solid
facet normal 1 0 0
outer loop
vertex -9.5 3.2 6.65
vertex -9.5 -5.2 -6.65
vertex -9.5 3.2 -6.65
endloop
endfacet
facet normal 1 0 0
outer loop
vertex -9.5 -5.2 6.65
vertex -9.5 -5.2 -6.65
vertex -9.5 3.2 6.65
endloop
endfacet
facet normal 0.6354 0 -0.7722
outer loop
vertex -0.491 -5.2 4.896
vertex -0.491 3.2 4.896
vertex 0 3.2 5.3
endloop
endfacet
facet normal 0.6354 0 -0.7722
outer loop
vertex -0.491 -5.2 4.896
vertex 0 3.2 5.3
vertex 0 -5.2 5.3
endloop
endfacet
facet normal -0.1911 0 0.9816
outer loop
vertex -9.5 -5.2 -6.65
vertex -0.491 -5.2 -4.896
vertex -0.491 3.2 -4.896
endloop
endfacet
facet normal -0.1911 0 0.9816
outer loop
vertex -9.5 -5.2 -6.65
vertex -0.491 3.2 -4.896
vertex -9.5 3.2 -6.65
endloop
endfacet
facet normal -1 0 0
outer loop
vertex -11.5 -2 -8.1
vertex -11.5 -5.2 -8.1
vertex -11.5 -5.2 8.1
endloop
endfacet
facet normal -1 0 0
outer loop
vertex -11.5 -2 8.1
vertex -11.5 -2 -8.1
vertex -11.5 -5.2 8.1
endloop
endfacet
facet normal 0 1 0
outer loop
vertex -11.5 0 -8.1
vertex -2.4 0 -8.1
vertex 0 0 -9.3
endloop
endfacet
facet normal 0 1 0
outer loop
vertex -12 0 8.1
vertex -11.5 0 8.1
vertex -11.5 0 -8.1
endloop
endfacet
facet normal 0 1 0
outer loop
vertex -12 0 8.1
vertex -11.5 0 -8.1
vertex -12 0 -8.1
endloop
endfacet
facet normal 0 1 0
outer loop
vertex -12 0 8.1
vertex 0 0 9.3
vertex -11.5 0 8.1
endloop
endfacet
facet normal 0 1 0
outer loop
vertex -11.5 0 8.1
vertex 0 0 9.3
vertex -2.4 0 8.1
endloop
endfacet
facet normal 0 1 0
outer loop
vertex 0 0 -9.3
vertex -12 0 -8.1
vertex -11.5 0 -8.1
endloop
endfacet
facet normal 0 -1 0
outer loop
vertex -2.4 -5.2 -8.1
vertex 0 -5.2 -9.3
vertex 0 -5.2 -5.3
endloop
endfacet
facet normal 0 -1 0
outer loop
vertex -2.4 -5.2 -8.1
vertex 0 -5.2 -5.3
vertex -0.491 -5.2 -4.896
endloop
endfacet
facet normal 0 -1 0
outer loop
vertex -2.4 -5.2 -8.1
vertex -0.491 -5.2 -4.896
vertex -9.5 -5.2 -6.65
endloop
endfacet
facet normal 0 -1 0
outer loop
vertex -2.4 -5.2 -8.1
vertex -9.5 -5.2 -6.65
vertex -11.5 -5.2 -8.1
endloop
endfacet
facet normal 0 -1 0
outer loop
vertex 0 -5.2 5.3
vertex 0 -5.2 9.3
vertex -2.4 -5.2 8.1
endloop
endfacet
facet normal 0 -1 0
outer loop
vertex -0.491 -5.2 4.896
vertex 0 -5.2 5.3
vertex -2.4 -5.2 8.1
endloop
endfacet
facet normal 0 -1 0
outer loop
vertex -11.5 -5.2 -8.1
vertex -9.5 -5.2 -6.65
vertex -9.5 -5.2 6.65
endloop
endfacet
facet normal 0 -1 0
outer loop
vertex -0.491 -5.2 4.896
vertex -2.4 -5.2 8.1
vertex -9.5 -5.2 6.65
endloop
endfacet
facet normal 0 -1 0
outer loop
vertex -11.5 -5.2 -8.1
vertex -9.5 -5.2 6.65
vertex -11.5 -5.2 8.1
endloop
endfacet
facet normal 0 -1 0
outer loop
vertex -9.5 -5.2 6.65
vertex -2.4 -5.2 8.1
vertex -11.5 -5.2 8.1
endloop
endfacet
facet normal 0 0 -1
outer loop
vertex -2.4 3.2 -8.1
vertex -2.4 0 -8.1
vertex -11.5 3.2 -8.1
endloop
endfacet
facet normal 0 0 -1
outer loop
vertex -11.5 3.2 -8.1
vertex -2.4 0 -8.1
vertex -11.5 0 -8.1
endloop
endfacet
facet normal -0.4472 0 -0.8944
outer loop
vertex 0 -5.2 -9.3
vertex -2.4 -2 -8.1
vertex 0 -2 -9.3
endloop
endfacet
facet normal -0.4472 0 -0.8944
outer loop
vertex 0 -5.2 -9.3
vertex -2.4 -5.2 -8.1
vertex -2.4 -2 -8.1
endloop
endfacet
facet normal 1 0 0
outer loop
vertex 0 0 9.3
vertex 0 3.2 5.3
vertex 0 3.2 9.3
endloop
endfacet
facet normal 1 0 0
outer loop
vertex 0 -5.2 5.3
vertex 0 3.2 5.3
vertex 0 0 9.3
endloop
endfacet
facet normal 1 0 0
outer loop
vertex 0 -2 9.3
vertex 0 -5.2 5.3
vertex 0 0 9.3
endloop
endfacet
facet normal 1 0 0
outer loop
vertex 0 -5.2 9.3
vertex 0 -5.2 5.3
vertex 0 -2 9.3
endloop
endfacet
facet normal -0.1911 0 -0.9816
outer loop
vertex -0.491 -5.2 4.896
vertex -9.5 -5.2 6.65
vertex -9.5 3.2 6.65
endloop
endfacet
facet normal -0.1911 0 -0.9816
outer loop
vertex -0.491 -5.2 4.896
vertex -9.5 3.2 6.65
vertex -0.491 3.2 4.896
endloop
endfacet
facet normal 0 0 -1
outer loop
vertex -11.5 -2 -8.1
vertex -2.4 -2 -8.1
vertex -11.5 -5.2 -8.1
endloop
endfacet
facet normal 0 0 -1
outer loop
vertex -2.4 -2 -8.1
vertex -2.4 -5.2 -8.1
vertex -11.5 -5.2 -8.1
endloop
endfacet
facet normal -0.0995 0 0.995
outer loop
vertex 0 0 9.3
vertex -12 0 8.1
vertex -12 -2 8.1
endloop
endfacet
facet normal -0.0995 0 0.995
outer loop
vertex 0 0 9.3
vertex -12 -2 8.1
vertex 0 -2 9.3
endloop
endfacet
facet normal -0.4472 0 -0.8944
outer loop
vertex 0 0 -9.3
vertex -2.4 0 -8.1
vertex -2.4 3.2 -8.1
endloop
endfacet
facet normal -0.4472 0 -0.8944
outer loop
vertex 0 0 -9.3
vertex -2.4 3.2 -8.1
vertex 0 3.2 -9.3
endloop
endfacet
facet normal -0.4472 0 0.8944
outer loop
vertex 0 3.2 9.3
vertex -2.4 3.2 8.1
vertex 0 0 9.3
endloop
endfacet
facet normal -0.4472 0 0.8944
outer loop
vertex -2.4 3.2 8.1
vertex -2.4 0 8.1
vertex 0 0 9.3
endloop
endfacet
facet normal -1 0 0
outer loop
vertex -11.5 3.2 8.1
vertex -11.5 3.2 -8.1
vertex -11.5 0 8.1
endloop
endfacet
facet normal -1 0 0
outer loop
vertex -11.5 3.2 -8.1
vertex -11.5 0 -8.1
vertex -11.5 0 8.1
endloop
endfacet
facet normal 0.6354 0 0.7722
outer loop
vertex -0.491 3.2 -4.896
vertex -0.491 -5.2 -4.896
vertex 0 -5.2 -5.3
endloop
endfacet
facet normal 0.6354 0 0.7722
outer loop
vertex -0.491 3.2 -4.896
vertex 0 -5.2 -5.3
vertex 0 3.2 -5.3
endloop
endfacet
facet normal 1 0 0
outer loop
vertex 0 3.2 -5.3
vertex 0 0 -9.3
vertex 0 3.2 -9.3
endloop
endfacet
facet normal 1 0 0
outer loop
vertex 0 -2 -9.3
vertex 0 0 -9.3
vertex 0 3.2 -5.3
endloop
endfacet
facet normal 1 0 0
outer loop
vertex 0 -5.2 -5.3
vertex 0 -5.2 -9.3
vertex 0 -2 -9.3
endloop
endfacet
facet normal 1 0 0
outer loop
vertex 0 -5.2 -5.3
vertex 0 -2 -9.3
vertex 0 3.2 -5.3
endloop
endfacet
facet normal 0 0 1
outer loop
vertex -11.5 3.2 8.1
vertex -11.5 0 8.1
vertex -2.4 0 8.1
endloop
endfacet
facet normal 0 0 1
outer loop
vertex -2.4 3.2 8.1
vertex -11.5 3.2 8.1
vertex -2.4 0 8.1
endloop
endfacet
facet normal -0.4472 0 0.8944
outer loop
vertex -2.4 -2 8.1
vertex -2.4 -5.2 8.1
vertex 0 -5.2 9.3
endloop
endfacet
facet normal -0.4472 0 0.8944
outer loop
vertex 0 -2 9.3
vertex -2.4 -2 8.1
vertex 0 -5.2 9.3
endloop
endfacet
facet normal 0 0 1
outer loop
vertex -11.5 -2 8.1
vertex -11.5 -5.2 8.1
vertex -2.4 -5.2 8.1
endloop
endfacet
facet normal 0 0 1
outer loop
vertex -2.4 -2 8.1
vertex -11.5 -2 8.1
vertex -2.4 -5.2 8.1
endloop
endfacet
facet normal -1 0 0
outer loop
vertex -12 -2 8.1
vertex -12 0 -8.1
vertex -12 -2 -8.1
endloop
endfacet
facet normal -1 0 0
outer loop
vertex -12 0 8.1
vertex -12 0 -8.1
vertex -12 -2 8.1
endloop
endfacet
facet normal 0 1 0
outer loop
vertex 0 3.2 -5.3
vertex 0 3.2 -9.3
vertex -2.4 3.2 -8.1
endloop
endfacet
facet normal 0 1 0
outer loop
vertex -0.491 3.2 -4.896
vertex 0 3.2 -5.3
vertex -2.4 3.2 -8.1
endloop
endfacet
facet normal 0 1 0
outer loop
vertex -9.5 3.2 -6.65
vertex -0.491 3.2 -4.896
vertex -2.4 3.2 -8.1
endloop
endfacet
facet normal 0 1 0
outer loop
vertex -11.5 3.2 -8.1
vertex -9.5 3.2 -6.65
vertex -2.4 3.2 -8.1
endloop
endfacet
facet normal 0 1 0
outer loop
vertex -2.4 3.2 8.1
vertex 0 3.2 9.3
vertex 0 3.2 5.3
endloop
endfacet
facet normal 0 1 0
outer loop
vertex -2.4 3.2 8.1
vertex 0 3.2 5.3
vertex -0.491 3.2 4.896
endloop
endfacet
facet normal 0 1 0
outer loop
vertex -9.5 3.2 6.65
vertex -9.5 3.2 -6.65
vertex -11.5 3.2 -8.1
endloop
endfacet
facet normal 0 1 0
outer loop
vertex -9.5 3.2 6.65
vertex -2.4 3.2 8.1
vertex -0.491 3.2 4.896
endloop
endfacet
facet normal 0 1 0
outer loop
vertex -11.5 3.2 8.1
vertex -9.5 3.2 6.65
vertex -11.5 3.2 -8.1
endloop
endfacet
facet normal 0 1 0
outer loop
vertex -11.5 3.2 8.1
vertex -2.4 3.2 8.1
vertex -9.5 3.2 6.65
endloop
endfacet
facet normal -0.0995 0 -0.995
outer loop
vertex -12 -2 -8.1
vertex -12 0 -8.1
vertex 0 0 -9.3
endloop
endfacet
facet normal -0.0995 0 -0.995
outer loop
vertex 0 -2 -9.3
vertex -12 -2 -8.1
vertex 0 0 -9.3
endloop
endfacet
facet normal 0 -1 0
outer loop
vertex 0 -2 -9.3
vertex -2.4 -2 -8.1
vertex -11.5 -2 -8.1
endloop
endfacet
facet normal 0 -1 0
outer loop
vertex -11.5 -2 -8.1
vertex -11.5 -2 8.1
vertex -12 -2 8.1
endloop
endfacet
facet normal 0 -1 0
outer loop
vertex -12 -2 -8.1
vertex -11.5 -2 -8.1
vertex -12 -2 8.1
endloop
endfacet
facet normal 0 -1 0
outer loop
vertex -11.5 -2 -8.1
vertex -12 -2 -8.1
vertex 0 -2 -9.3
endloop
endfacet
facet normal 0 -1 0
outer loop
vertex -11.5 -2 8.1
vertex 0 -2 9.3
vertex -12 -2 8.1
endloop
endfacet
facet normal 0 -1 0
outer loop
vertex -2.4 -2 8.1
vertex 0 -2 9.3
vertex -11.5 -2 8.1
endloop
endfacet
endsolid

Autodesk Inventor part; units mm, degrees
ref_plane "YZ Plane" through (0, 0, 0) normal (1, 0, 0) x (0, 1, 0)
ref_plane "XZ Plane" through (0, 0, 0) normal (0, 1, 0) x (-1, 0, 0)
ref_plane "XY Plane" through (0, 0, 0) normal (0, 0, 1) x (1, 0, 0)
sketch "スケッチ1" plane through (0, 0, 0) normal (0, 1, 0) x (-1, 0, 0)
  line L0 (0, -13.02) -> (0, 13.02) projected
  line L1 (-2.4, 0) -> (14.4, 0) projected
  line L2 (0, -4.8) -> (9.5, -6.65)
  line L3 (9.5, -6.65) -> (9.5, 6.65)
  line L4 (9.5, 6.65) -> (0, 4.8)
  line L5 (0, -9.3) -> (0, -4.8)
  line L6 (0, 4.8) -> (0, 9.3)
  line L7 (2.4, -8.1) -> (11.5, -8.1)
  line L8 (11.5, -8.1) -> (11.5, 8.1)
  line L9 (11.5, 8.1) -> (2.4, 8.1)
  line L10 (2.4, -8.1) -> (0, -9.3)
  line L11 (2.4, 8.1) -> (0, 9.3)
  line L12 (12, -8.1) -> (12, 8.1)
  line L13 (12, 8.1) -> (0, 9.3)
  line L14 (12, -8.1) -> (0, -9.3)
  point P0 (0, 0)
  point P1 (0, 9.3)
  point P2 (0, -9.3)
  dimension "d3" = 13.3
  dimension "d5" = 9.6
  dimension "d14" = 2
  dimension "d63" = 1.2
  dimension "d64" = 18.6
  dimension "d65" = 12
  dimension "d74" = 18.6
  dimension "d75" = 1.2
  dimension "d93" = 9.5
  dimension "d94" = 2.4
extrude "押し出し2" add sketch "スケッチ1" along normal blind 3.2 and the other way blind 5.2 contours L0 L2 L3 L1 L8 L7 L10 | L0 L11 L9 L8 L1 L3 L4
extrude "押し出し1" add sketch "スケッチ1" against normal blind 2 contours L0 L2 L3 L1 L8 L7 L10 | L10 L7 L8 L1 L12 L14 | L1 L8 L9 L11 L13 L12 | L0 L11 L9 L8 L1 L3 L4
chamfer "面取り3" distance 0.5 angle 45 2 edges at (0, -1, 4.8) (0, -1, -4.8)
equation "\"rib\" = 0.5"
equation "\"gap\" = 0.2"
properties part number "StraightRais-215" material "ABS プラスチック"
